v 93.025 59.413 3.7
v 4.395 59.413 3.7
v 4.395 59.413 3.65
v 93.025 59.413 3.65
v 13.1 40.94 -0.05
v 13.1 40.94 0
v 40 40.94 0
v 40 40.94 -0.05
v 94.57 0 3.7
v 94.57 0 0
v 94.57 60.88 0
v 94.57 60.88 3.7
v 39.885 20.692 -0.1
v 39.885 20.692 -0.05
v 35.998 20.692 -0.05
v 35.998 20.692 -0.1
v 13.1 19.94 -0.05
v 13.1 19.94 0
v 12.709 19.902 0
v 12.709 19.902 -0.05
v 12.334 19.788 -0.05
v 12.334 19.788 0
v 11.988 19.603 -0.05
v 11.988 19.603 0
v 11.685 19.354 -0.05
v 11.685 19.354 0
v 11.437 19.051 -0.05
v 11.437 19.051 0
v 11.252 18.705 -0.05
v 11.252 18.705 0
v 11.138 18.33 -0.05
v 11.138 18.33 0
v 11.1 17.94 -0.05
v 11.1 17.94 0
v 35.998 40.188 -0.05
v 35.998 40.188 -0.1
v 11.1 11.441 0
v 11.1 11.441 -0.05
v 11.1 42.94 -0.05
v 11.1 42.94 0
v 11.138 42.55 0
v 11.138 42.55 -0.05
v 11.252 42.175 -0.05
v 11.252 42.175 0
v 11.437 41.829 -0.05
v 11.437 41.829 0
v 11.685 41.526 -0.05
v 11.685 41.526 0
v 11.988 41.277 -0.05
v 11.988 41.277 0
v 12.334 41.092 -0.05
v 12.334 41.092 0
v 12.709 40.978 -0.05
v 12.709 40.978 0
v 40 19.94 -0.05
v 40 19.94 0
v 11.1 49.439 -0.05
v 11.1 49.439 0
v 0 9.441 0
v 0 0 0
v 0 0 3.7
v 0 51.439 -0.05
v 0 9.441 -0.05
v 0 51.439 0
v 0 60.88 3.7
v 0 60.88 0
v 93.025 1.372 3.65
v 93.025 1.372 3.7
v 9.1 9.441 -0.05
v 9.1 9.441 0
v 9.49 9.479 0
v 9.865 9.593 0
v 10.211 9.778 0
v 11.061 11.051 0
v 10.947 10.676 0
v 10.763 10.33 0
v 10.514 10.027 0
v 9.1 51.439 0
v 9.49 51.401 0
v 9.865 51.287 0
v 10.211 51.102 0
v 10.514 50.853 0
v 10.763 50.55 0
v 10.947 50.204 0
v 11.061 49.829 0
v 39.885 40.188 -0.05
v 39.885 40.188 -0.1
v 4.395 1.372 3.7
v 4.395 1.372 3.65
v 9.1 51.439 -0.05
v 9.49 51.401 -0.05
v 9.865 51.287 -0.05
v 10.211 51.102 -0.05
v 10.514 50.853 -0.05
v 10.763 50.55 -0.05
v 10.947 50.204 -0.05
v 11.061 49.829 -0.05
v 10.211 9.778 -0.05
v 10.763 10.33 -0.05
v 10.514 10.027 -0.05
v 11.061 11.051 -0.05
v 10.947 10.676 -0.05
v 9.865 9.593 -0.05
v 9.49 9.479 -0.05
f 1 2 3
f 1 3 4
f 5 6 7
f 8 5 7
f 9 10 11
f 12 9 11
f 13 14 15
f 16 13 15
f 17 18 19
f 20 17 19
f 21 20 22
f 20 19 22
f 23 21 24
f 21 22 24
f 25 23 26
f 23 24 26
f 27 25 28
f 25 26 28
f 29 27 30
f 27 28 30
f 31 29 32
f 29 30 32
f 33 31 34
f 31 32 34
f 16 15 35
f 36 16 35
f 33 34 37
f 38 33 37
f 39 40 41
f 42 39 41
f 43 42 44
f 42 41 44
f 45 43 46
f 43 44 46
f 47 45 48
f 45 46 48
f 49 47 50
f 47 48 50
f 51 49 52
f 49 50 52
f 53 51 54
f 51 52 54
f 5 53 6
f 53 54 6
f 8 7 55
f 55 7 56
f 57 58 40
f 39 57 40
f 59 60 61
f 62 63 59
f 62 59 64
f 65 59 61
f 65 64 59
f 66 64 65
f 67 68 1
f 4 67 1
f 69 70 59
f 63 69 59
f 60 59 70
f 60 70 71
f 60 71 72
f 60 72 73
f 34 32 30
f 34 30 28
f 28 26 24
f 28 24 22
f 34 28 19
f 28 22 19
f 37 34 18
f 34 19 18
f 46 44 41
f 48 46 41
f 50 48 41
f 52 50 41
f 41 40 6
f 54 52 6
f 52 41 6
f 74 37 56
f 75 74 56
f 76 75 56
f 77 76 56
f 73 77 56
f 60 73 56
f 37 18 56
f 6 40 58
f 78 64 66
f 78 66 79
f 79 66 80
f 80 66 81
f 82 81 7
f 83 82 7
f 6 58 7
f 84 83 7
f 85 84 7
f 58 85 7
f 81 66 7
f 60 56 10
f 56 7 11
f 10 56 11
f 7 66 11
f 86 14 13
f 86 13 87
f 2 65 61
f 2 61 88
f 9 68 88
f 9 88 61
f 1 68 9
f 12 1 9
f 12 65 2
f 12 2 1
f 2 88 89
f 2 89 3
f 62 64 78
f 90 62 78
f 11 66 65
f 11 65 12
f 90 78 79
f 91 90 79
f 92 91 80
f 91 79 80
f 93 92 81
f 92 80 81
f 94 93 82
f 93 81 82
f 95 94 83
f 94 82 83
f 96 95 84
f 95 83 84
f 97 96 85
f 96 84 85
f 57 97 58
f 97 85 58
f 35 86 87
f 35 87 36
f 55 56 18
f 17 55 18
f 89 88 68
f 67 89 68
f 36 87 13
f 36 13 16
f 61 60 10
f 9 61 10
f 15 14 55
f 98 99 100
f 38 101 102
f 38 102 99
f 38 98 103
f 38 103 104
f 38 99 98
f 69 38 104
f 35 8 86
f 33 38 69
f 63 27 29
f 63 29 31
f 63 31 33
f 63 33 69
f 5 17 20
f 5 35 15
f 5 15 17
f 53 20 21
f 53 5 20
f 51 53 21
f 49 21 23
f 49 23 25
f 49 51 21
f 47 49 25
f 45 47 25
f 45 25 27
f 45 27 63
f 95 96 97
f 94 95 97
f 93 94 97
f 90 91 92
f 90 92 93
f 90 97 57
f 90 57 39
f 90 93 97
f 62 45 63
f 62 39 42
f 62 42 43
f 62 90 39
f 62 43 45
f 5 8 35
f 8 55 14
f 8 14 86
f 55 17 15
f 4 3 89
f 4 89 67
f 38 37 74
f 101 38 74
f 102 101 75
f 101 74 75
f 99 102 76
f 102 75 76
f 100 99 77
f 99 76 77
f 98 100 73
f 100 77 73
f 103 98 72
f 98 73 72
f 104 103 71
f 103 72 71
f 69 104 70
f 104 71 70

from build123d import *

# Parameters (mm, degrees)
ESQUISSE1_W             = 94.57
ESQUISSE1_H             = 60.88
BOSS_EXTRU_1_DEPTH      = 3.7
ESQUISSE2_W             = 88.629386258
ESQUISSE2_H             = 58.041323691
ENL_V_MAT_EXTRU_1_DEPTH = 0.05
ESQUISSE3_W             = 3.887425577
ESQUISSE3_H             = 19.495847756
BOSS_EXTRU_2_DEPTH      = 0.05
ESQUISSE4_W             = 3.887425577
ESQUISSE4_H             = 19.495847756
BOSS_EXTRU_3_DEPTH      = 0.1


with BuildPart() as part:
    # Esquisse1 → Boss.-Extru.1 (new body)
    with BuildSketch(Plane.XY):
        with Locations((47.285, 30.44)):
            Rectangle(ESQUISSE1_W, ESQUISSE1_H)
    extrude(amount=BOSS_EXTRU_1_DEPTH)

    # Esquisse2 → Enlèv. mat.-Extru.1 (cut)
    with BuildSketch(Plane.XY.offset(3.7)):
        with Locations((48.709909747, 30.392503009)):
            Rectangle(ESQUISSE2_W, ESQUISSE2_H)
    extrude(amount=-ENL_V_MAT_EXTRU_1_DEPTH, mode=Mode.SUBTRACT)

    # Esquisse3 → Boss.-Extru.2 (add)
    with BuildSketch(Plane(origin=(0, 0, 0), x_dir=(-1, 0, 0), z_dir=(0, 0, -1))):
        with BuildLine():
            Line((-9.099589702, 9.441066071), (0, 9.441066071))
            Line((0, 9.441066071), (0, 51.438933929))
            Line((0, 51.438933929), (-9.099589702, 51.438933929))
            ThreePointArc((-9.099589702, 51.438933929), (-10.513803264, 50.853147491), (-11.099589702, 49.438933929))
            Line((-11.099589702, 49.438933929), (-11.099589702, 42.94))
            ThreePointArc((-11.099589702, 42.94), (-11.68537614, 41.525786438), (-13.099589702, 40.94))
            Line((-13.099589702, 40.94), (-40, 40.94))
            Line((-40, 40.94), (-40, 19.94))
            Line((-40, 19.94), (-13.099589702, 19.94))
            ThreePointArc((-13.099589702, 19.94), (-11.68537614, 19.354213562), (-11.099589702, 17.94))
            Line((-11.099589702, 17.94), (-11.099589702, 11.441066071))
            ThreePointArc((-11.099589702, 11.441066071), (-10.513803264, 10.026852509), (-9.099589702, 9.441066071))
        make_face()
        with Locations((-37.941401464, 30.44)):
            Rectangle(ESQUISSE3_W, ESQUISSE3_H, mode=Mode.SUBTRACT)
    extrude(amount=BOSS_EXTRU_2_DEPTH)

    # Esquisse4 → Boss.-Extru.3 (add)
    with BuildSketch(Plane(origin=(0, 0, 0), x_dir=(-1, 0, 0), z_dir=(0, 0, -1))):
        with Locations((-37.941401464, 30.44)):
            Rectangle(ESQUISSE4_W, ESQUISSE4_H)
    extrude(amount=BOSS_EXTRU_3_DEPTH)


solid = part.part
